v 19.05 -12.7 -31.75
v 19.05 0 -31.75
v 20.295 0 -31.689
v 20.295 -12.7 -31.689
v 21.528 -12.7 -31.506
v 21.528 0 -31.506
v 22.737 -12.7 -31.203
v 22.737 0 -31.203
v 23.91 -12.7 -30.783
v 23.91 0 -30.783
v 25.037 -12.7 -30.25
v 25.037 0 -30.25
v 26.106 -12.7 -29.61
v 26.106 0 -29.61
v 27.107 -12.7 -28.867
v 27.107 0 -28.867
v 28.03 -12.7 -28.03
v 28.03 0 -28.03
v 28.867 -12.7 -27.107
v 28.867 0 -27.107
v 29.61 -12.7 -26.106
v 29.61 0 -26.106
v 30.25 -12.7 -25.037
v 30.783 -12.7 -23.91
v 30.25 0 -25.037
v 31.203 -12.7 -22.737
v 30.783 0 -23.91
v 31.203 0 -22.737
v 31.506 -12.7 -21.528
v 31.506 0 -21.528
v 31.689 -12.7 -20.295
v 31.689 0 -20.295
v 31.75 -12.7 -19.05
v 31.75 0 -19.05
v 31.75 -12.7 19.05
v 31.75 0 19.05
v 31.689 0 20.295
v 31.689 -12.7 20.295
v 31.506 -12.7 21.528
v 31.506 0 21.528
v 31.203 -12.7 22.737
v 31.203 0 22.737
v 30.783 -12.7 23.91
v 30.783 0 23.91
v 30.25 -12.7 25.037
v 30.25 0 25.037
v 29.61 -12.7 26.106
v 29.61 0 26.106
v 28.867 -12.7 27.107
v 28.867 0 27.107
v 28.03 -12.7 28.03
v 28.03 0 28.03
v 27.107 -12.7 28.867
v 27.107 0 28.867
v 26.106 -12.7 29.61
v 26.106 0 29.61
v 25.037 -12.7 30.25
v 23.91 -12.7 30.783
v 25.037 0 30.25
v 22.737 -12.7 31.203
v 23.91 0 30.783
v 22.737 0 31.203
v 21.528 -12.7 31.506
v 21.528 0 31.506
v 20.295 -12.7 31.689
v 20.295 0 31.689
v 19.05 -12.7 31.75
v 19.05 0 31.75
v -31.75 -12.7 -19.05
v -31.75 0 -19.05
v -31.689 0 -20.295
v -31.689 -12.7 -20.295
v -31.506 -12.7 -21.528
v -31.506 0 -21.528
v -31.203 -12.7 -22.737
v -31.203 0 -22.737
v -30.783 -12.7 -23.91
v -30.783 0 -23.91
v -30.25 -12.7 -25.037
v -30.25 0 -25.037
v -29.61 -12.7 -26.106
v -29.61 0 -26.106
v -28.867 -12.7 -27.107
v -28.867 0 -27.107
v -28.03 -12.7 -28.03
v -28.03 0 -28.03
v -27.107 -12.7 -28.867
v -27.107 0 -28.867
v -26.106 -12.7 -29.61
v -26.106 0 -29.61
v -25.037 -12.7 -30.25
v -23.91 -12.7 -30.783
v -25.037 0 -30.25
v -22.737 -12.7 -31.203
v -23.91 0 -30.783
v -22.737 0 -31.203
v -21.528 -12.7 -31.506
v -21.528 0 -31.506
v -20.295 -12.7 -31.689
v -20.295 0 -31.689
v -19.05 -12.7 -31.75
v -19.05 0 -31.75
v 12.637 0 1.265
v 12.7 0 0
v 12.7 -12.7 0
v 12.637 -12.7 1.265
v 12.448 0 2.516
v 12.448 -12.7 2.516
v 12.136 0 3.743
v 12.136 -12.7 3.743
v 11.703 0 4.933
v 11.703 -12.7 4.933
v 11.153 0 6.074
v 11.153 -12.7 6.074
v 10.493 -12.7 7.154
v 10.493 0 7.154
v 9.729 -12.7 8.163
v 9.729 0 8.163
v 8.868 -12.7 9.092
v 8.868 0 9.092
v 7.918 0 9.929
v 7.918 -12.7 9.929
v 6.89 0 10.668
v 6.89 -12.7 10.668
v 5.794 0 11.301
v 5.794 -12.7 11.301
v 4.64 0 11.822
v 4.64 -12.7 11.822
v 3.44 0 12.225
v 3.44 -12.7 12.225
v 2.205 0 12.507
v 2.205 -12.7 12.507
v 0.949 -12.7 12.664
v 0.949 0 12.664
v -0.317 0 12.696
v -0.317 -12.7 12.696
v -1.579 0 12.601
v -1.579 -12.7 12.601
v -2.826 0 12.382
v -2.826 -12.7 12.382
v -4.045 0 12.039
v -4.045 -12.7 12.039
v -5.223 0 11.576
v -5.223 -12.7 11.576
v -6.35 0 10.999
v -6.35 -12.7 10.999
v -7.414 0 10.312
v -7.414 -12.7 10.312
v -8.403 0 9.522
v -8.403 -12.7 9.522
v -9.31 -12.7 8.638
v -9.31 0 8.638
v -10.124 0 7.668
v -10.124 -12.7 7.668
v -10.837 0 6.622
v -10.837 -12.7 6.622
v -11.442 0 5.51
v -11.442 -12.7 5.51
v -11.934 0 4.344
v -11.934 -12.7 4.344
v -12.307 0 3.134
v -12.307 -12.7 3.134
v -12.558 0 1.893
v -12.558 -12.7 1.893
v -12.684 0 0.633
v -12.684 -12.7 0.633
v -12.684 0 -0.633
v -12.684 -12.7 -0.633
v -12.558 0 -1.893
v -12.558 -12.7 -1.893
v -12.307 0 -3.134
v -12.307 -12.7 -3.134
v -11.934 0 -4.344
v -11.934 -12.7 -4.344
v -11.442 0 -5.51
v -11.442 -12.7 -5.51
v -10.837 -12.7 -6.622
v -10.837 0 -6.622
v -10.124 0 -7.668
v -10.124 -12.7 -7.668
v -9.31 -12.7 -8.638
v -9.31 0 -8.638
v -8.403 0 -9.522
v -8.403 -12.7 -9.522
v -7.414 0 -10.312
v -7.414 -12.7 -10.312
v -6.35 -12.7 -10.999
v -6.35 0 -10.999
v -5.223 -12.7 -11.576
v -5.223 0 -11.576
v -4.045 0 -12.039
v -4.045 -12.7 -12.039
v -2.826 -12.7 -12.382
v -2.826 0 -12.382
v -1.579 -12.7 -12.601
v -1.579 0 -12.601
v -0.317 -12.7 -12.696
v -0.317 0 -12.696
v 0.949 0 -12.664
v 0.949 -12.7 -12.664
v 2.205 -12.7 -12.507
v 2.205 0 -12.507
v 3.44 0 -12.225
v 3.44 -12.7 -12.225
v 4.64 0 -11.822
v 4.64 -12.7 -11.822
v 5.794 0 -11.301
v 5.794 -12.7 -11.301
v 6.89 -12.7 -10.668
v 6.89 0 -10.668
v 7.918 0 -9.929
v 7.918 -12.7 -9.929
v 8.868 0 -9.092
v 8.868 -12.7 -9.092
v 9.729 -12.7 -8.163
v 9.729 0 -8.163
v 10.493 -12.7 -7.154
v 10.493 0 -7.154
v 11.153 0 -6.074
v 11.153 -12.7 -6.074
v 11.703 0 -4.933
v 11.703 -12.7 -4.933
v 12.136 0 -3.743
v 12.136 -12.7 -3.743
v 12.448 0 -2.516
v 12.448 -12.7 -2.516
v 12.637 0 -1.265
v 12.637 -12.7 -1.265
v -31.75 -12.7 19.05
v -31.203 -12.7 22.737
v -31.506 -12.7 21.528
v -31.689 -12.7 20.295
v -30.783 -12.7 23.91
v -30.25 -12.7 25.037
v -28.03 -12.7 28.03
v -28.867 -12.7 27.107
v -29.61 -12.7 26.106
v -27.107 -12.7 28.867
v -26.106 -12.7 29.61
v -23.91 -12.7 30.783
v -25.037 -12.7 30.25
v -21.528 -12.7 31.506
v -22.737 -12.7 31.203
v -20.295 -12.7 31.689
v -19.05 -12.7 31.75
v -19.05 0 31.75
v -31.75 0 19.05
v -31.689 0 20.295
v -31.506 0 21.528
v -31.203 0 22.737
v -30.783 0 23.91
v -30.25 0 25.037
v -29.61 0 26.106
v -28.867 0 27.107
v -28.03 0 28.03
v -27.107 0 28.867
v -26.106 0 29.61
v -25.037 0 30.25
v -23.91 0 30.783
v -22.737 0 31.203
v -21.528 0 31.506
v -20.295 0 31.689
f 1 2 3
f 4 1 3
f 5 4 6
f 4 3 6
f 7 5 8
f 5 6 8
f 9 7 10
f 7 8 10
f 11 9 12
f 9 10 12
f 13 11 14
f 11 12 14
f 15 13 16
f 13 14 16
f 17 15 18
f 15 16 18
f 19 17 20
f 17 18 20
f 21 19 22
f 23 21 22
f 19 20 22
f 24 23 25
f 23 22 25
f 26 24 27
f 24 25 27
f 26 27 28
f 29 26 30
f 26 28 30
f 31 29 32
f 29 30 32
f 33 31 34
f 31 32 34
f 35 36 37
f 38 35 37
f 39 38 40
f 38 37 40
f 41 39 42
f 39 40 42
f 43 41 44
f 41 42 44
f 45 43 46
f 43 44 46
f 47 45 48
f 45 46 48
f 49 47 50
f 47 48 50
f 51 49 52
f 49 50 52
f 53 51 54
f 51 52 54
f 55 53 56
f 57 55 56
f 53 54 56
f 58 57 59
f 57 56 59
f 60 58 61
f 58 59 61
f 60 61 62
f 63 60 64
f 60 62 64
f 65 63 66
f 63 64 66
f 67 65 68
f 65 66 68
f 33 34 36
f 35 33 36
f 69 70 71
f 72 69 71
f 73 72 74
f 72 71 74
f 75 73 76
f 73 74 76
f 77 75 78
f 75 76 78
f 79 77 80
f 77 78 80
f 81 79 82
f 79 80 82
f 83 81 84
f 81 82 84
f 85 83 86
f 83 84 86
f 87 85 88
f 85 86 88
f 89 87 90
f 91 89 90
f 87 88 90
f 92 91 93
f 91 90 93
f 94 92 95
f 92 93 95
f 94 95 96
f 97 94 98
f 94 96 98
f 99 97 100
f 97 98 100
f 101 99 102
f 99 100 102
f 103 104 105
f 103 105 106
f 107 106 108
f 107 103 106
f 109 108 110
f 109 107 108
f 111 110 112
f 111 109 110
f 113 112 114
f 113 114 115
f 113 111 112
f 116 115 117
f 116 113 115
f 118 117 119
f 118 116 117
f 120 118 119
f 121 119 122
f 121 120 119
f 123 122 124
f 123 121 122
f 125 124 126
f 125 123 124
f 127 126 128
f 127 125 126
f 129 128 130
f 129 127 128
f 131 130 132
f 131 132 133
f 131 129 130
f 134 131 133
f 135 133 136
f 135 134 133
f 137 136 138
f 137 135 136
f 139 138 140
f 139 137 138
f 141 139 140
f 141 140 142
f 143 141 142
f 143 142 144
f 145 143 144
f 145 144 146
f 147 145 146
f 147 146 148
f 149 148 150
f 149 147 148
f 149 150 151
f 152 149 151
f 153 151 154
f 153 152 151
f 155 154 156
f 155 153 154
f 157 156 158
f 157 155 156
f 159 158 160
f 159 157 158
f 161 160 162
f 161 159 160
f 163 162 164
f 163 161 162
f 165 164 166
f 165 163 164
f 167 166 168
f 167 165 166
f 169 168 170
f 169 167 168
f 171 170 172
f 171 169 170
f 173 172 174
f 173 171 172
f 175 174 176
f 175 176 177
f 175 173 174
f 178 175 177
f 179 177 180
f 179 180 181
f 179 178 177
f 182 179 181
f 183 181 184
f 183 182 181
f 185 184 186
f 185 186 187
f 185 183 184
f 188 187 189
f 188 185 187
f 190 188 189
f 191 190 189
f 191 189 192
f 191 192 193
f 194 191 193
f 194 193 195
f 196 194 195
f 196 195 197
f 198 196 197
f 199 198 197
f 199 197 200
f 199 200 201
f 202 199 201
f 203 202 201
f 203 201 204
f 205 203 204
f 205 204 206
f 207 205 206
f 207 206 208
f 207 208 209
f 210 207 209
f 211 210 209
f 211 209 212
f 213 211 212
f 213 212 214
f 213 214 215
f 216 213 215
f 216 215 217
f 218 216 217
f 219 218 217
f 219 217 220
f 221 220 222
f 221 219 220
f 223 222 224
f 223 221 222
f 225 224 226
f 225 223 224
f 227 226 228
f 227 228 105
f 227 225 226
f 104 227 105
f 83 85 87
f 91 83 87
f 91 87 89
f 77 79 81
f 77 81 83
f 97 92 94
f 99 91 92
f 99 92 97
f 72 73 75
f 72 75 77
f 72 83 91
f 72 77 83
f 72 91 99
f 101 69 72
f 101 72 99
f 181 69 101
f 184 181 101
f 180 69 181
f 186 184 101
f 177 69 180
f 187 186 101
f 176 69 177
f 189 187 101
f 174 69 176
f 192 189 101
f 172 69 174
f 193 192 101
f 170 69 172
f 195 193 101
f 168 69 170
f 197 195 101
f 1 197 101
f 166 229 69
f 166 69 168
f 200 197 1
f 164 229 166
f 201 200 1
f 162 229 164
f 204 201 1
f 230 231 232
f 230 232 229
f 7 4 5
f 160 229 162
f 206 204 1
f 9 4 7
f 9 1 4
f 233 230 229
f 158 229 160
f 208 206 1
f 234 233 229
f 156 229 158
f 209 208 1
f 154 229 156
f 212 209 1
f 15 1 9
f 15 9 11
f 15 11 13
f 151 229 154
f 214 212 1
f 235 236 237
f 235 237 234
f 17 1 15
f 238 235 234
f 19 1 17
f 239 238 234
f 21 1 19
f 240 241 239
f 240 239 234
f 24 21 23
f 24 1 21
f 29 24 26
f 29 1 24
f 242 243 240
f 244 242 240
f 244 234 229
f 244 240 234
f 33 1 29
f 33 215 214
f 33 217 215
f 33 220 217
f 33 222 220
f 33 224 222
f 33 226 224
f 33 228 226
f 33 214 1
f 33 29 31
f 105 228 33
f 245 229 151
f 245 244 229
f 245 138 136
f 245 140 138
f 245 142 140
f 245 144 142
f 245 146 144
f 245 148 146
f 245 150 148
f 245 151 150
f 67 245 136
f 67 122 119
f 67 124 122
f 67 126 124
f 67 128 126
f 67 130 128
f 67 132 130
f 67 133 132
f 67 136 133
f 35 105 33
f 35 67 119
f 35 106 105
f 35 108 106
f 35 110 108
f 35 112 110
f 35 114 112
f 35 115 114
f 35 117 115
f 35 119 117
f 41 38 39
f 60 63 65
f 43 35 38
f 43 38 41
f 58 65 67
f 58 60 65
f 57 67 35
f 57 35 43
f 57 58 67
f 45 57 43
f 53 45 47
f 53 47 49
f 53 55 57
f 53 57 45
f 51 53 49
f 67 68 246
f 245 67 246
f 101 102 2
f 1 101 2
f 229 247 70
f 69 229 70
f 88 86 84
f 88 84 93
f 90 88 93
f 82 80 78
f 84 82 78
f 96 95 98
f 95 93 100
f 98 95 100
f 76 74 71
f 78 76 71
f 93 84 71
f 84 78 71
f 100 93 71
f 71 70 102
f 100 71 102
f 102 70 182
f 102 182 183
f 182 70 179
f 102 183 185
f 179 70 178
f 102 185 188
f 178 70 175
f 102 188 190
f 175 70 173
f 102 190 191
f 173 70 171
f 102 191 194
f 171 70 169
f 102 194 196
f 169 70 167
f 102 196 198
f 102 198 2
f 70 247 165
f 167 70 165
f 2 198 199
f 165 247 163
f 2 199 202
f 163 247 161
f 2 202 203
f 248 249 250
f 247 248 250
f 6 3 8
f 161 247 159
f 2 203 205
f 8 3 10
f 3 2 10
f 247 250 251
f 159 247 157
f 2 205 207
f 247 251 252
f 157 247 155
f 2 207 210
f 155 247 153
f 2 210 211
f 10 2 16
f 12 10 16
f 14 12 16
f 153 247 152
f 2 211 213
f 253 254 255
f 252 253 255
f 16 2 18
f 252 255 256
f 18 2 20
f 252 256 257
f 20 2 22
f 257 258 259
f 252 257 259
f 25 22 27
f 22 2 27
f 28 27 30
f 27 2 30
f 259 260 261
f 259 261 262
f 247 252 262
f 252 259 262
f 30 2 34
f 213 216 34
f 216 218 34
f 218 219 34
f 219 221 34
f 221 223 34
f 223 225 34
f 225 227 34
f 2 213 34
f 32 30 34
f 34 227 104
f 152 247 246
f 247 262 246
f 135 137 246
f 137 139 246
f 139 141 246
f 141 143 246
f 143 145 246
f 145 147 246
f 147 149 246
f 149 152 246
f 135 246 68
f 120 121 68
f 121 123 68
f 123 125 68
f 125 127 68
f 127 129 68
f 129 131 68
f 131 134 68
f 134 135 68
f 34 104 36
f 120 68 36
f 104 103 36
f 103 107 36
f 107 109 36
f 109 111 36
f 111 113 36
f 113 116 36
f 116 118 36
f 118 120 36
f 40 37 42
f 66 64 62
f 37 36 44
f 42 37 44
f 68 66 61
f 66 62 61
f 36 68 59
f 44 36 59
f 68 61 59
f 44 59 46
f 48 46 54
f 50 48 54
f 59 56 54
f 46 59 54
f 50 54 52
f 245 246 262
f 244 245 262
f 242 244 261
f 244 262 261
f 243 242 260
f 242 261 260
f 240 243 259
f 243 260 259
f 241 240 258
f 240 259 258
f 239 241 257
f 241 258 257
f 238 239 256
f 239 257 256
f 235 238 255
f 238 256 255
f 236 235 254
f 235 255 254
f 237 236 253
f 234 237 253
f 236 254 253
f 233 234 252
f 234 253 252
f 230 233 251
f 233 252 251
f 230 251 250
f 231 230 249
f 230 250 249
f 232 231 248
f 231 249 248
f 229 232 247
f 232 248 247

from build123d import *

# Parameters (mm, degrees)
F0_R     = 12.7
F1_DEPTH = 12.7


with BuildPart() as f1:
    # F0 (on Front) → F1 (new body)
    with BuildSketch(Plane.XZ):
        with BuildLine():
            ThreePointArc((31.75, 19.05), (28.030256, 28.030256), (19.05, 31.75))
            Line((19.05, 31.75), (-19.05, 31.75))
            ThreePointArc((-19.05, 31.75), (-28.030256, 28.030256), (-31.75, 19.05))
            Line((-31.75, 19.05), (-31.75, -19.05))
            ThreePointArc((-31.75, -19.05), (-28.030256, -28.030256), (-19.05, -31.75))
            Line((-19.05, -31.75), (19.05, -31.75))
            ThreePointArc((19.05, -31.75), (28.030256, -28.030256), (31.75, -19.05))
            Line((31.75, -19.05), (31.75, 19.05))
        make_face()
        Circle(F0_R, mode=Mode.SUBTRACT)
    extrude(amount=F1_DEPTH)


solid = f1.part
